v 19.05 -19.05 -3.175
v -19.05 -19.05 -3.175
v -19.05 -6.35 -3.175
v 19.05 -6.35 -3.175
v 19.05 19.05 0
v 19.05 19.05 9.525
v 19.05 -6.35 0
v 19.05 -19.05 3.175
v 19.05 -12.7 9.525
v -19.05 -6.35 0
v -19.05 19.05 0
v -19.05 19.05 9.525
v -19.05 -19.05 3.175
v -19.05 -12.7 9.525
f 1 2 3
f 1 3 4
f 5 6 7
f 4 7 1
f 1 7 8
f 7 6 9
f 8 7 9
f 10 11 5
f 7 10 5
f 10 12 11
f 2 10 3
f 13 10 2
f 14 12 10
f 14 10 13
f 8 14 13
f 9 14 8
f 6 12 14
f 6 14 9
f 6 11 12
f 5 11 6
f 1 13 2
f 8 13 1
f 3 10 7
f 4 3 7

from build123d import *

# Parameters (mm, degrees)
F0_W     = 38.1
F0_H     = 38.1
F1_DEPTH = 9.525
F2_SIZE  = 6.35
F3_W     = 38.1
F3_H     = 12.7
F4_DEPTH = 3.175


# Not quite as in the source:
# - a feature of the source that left no trace in its solid (it failed there, or was rolled back) is left out


with BuildPart() as f1:
    # F0 (on Top) → F1 (new body)
    with BuildSketch(Plane.XY):
        Rectangle(F0_W, F0_H)
    extrude(amount=F1_DEPTH)

    # F2
    f2_edges = [f1.edges().sort_by_distance(p)[0] for p in [
        (0, -19.05, 9.525),
    ]]
    chamfer(f2_edges, length=F2_SIZE)

    # F3 (on face) → F4 (join)
    with BuildSketch(Plane(origin=(0, 0, 0), x_dir=(1, 0, 0), z_dir=(0, 0, -1))):
        with Locations((0, 12.7)):
            Rectangle(F3_W, F3_H)
    extrude(amount=F4_DEPTH)


solid = f1.part
